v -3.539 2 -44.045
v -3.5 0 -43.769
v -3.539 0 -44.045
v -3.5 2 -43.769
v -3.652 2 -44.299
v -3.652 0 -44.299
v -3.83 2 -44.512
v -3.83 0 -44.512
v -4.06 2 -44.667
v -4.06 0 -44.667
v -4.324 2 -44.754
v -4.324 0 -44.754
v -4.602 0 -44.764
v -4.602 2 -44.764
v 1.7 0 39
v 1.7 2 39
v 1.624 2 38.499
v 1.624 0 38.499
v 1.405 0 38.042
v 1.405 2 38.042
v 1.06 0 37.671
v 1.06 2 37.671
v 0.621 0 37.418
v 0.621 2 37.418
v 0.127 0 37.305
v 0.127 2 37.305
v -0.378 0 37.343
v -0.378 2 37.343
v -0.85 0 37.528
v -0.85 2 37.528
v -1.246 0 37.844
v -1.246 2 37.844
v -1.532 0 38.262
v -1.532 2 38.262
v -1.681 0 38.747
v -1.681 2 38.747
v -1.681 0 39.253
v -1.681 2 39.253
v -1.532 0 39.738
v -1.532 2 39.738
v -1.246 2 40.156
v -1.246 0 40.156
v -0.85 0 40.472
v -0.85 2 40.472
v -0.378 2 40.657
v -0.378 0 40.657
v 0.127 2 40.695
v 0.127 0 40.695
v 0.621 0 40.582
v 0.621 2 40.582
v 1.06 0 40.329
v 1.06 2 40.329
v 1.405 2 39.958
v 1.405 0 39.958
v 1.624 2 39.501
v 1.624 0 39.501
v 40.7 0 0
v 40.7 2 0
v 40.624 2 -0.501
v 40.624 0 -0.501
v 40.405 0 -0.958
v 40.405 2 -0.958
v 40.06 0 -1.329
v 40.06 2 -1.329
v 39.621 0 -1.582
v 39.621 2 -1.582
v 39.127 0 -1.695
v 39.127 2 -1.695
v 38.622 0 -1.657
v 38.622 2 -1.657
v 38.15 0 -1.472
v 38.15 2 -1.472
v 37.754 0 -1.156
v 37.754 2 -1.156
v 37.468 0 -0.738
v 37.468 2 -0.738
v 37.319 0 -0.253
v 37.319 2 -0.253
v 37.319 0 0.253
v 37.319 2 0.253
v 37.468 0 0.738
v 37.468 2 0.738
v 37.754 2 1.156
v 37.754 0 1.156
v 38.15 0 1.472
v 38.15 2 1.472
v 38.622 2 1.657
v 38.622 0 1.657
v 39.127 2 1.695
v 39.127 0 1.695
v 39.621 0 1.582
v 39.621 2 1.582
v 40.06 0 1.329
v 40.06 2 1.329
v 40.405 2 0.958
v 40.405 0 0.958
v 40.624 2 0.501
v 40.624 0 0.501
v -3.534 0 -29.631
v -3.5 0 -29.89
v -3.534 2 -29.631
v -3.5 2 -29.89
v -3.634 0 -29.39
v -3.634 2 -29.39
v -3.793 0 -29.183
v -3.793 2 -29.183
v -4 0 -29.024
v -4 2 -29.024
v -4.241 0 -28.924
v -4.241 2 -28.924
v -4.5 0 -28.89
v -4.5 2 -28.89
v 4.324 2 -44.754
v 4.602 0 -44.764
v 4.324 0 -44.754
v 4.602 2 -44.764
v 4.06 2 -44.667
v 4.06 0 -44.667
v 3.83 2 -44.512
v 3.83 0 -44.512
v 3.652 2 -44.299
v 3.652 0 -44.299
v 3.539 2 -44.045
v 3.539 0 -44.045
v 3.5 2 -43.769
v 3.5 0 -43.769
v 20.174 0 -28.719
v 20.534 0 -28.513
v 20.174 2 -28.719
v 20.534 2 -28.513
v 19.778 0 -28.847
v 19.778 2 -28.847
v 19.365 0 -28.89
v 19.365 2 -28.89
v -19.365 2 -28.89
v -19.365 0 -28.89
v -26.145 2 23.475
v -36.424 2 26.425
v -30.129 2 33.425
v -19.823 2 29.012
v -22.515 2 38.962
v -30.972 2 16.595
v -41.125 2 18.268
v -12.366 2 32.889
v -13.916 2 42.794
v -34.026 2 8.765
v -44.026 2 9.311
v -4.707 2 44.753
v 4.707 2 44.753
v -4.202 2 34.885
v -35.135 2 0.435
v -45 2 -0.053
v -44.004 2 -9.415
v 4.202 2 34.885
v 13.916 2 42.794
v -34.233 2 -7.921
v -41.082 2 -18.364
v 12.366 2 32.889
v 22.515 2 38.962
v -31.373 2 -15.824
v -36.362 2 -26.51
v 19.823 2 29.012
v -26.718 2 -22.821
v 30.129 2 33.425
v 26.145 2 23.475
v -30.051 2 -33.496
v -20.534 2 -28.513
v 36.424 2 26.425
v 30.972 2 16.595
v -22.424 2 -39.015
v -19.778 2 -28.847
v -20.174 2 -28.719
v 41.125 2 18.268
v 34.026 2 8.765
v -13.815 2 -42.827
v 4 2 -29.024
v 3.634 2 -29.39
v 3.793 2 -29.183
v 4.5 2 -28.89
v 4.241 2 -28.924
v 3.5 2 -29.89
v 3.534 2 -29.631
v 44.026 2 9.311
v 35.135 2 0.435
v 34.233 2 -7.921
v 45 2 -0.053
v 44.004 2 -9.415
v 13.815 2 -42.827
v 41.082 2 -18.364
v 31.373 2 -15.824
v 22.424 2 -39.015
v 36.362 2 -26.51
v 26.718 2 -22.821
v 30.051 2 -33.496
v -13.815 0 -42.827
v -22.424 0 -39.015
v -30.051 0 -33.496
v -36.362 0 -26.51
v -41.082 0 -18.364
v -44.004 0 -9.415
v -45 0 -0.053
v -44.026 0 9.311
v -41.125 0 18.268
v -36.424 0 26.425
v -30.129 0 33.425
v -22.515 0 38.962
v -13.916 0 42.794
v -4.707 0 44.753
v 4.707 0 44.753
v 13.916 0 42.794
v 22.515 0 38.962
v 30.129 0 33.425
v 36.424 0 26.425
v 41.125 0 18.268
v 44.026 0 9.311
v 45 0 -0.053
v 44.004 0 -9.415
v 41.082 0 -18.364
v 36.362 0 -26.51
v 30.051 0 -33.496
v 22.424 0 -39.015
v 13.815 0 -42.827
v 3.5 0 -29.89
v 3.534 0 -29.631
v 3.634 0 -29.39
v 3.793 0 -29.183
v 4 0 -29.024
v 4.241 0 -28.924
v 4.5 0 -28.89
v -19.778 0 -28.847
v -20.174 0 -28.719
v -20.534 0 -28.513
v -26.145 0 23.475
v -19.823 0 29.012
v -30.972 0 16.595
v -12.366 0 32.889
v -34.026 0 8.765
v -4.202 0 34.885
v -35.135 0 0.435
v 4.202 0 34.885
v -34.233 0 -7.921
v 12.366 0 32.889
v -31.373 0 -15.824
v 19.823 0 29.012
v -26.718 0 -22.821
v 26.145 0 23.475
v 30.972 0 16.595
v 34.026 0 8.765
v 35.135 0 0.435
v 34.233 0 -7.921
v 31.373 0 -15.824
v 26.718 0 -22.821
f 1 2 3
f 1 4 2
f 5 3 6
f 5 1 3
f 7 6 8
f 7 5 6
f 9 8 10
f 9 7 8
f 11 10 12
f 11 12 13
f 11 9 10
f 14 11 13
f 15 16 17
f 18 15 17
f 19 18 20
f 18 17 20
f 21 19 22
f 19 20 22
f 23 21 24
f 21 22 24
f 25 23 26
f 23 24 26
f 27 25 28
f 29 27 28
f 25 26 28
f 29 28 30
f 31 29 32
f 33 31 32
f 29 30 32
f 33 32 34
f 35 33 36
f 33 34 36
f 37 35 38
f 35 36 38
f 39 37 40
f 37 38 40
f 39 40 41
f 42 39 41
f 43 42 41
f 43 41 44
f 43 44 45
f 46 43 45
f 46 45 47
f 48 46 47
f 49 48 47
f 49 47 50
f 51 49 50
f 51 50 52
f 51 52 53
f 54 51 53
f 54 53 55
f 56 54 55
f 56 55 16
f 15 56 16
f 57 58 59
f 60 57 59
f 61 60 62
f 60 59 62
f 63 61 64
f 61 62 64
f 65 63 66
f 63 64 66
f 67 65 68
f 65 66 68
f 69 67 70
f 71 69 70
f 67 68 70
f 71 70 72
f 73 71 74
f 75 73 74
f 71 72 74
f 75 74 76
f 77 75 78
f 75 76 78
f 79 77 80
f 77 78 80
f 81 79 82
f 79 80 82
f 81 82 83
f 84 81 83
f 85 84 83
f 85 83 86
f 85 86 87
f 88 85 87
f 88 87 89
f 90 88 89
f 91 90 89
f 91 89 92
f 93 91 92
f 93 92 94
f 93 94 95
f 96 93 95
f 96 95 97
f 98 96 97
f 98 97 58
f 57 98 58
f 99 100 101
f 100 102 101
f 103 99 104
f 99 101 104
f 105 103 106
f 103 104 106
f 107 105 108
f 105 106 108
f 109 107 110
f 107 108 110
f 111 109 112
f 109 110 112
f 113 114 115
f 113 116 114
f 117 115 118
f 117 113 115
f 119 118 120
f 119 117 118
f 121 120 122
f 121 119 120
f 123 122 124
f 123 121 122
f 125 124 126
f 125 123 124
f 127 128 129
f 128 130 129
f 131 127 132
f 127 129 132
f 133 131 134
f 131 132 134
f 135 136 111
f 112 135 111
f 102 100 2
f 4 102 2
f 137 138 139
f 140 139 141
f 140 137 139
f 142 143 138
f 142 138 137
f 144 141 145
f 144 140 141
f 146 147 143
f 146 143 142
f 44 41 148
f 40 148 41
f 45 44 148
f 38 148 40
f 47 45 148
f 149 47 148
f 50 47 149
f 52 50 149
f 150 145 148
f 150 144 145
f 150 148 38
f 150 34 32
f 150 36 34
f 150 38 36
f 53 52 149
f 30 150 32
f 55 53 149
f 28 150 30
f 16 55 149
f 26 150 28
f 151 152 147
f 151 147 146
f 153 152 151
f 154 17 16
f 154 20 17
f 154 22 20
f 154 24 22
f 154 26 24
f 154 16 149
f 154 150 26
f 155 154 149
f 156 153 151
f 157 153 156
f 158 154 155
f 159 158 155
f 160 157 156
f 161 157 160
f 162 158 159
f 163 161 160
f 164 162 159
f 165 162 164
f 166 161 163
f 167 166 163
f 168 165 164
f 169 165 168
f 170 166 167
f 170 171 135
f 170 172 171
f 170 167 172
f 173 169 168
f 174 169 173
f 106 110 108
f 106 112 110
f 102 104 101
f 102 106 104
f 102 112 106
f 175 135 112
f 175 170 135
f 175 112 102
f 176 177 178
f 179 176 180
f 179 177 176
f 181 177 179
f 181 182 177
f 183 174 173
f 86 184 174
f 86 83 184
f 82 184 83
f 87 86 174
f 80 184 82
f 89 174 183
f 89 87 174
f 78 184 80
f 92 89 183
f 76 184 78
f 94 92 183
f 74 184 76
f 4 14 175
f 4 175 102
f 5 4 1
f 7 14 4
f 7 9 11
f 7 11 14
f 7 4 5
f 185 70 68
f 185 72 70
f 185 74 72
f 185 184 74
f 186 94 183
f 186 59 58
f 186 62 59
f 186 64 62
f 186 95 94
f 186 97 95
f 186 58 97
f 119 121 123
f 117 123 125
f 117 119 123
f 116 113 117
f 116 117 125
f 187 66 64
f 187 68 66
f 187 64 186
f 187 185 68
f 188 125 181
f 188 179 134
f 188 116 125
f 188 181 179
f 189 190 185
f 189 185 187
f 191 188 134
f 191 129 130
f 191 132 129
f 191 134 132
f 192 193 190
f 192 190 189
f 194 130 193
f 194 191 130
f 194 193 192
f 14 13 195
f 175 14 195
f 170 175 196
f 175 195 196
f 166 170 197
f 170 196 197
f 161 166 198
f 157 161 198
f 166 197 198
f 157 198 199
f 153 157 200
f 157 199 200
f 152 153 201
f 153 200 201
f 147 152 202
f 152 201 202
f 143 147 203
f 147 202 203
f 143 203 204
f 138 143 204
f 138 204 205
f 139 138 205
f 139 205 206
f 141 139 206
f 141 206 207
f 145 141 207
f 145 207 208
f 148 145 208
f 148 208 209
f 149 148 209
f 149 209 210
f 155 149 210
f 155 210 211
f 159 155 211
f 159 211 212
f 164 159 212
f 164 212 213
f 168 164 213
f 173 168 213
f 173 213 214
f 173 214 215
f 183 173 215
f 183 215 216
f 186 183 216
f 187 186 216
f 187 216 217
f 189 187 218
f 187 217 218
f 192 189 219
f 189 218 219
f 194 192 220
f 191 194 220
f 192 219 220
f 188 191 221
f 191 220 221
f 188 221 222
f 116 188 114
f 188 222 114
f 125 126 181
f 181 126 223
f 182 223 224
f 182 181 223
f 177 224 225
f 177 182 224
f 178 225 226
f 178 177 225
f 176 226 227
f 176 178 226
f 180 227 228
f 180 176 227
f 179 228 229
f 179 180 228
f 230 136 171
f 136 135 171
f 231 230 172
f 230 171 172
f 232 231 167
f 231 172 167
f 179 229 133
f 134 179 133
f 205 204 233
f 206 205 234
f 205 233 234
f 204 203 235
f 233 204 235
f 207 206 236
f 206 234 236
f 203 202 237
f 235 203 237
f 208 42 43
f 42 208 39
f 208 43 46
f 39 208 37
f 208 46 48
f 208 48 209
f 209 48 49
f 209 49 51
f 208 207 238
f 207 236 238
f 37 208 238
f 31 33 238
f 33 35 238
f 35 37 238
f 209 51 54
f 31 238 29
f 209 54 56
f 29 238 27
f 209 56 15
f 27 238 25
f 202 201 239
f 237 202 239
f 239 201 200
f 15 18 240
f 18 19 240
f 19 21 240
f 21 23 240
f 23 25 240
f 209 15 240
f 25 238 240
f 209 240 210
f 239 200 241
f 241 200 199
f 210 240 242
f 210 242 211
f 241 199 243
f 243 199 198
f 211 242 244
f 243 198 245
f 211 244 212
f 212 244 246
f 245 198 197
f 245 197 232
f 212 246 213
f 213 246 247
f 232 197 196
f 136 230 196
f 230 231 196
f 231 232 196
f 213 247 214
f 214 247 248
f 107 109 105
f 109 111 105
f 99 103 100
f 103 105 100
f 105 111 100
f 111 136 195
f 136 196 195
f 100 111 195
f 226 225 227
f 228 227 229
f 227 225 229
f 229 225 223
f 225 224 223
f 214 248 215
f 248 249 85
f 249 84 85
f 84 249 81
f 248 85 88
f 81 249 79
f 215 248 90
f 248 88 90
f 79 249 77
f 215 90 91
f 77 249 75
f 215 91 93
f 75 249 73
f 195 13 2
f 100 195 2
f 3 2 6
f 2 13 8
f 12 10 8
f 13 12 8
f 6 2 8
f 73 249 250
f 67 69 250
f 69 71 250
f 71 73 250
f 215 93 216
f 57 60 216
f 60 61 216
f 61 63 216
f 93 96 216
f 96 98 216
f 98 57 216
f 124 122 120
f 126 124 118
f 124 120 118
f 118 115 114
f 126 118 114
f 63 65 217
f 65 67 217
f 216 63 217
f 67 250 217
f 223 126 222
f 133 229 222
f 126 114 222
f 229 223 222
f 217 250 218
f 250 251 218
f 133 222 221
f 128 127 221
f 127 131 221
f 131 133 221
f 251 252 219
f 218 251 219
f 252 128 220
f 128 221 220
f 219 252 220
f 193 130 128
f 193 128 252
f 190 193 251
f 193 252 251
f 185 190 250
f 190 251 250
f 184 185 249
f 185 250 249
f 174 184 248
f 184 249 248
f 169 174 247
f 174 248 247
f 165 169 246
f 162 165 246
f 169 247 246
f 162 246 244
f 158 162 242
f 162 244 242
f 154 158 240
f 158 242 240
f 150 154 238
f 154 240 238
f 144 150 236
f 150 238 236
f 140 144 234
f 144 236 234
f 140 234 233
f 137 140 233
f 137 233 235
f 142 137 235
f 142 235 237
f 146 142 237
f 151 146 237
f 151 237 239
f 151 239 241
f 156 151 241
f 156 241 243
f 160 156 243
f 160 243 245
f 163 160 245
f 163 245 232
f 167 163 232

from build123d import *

# Parameters (mm, degrees)
BOSS_EXTRU_1_DEPTH      = 2
ESQUISSE2_R             = 1.7
ENL_V_MAT_EXTRU_1_DEPTH = 3
CONG_1_R                = 1
CONG_2_R                = 2


with BuildPart() as part:
    # Esquisse1 → Boss.-Extru.1 (new body)
    with BuildSketch(Plane(origin=(0, 0, 0), x_dir=(1, 0, 0), z_dir=(0, 1, 0))):
        with BuildLine():
            Line((-3.5, 28.89), (-3.5, 44.863682417))
            ThreePointArc((-3.5, 44.863682417), (0, -45), (3.5, 44.863682417))
            Line((3.5, 44.863682417), (3.5, 28.89))
            Line((3.5, 28.89), (20, 28.89))
            ThreePointArc((20, 28.89), (0, -35.137331999), (-20, 28.89))
            Line((-20, 28.89), (-3.5, 28.89))
        make_face()
    extrude(amount=BOSS_EXTRU_1_DEPTH)

    # Esquisse2 → Enlèv. mat.-Extru.1 (cut, through all)
    with BuildSketch(Plane(origin=(0, 2, 0), x_dir=(1, 0, 0), z_dir=(0, 1, 0))):
        with Locations((39, 0)):
            Circle(ESQUISSE2_R)
        with Locations((0, -39)):
            Circle(ESQUISSE2_R)
    extrude(amount=-ENL_V_MAT_EXTRU_1_DEPTH, mode=Mode.SUBTRACT)

    # Congé1
    cong_1_edges = [part.edges().sort_by_distance(p)[0] for p in [
        (-3.5, 1, -44.863682417),
        (-3.5, 1, -28.89),
        (3.5, 1, -28.89),
        (3.5, 1, -44.863682417),
    ]]
    fillet(cong_1_edges, radius=CONG_1_R)

    # Congé2
    cong_2_edges = [part.edges().sort_by_distance(p)[0] for p in [
        (-20, 1, -28.89),
        (20, 1, -28.89),
    ]]
    fillet(cong_2_edges, radius=CONG_2_R)


solid = part.part
